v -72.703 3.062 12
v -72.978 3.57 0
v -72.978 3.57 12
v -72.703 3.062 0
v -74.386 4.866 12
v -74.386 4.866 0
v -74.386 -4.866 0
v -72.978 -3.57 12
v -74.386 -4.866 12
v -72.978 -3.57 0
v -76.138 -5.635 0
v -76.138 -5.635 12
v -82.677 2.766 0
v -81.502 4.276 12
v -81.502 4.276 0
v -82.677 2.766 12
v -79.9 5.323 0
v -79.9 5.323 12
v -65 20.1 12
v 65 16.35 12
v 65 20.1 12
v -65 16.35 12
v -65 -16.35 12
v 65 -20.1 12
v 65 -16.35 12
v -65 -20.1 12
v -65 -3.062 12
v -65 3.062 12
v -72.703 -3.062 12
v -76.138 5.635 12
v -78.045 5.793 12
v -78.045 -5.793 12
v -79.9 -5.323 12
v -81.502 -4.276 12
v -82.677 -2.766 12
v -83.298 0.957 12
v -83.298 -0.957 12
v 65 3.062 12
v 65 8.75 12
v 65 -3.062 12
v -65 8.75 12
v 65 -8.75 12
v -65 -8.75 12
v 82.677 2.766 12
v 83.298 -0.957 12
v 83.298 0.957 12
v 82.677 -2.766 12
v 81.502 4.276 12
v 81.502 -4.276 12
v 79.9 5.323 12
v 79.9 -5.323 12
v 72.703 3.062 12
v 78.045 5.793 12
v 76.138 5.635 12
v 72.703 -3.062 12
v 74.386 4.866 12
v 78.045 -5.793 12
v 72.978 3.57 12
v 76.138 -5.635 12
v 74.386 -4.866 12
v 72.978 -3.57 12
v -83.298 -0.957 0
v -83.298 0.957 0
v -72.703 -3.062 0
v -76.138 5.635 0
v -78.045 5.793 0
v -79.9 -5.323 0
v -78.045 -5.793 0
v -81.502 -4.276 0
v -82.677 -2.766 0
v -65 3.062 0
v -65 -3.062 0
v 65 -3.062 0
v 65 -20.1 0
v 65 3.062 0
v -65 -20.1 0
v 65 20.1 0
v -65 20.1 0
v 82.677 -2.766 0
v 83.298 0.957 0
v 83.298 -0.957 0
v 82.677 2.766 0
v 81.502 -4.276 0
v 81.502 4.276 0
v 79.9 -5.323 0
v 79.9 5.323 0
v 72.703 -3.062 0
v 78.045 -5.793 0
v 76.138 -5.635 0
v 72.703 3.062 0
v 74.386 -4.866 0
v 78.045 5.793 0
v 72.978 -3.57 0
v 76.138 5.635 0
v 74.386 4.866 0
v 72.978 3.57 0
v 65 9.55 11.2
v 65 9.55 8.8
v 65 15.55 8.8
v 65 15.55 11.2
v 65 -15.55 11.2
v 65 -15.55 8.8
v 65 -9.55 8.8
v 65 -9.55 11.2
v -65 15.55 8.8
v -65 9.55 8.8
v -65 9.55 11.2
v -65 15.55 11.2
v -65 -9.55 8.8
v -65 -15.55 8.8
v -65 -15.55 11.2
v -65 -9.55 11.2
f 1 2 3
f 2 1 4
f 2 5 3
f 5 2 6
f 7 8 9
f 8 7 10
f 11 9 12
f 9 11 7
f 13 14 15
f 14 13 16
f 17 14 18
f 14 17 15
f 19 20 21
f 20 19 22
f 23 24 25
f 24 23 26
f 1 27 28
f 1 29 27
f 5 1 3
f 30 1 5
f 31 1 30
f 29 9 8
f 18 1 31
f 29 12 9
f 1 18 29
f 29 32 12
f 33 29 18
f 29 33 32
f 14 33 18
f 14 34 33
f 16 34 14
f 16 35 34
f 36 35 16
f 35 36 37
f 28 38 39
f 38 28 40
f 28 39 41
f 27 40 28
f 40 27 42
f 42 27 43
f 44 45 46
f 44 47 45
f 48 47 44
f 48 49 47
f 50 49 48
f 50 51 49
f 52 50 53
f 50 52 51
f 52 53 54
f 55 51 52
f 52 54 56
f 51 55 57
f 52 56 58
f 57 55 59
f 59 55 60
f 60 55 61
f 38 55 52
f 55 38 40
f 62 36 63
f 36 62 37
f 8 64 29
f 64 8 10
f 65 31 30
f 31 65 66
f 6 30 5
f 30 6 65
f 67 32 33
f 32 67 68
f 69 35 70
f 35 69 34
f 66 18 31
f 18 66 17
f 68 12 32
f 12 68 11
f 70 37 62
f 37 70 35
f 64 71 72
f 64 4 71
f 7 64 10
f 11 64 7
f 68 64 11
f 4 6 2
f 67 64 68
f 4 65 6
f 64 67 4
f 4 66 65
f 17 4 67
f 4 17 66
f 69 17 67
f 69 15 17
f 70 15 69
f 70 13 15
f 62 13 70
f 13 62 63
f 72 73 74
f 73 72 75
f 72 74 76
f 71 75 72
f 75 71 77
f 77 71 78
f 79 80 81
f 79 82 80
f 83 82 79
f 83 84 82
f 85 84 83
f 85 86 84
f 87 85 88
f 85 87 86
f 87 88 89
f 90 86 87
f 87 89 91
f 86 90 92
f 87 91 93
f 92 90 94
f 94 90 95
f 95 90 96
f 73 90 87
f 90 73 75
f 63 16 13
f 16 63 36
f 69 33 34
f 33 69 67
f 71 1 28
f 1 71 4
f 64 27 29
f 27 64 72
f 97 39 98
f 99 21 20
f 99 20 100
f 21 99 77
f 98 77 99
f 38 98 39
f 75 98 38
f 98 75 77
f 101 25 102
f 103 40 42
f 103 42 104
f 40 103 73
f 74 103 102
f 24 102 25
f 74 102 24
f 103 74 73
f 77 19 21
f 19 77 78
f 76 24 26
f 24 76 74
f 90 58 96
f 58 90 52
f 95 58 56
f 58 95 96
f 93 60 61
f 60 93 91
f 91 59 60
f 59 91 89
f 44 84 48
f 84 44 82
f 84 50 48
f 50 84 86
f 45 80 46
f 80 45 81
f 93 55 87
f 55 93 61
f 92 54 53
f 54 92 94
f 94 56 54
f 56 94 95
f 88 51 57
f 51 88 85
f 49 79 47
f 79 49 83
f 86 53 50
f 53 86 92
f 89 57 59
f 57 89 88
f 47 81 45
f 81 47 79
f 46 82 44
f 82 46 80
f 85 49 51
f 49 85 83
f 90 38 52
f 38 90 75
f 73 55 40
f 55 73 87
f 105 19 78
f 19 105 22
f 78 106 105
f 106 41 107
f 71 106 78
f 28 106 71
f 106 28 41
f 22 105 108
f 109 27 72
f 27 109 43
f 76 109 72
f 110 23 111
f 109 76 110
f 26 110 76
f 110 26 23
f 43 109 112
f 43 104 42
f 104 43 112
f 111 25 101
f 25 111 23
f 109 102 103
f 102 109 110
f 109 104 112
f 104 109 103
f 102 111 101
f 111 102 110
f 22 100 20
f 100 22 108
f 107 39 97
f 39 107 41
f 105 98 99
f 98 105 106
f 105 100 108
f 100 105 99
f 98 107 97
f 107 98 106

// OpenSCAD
th=12;
tw=40.2;

rs=25.1;
rd=3.2;
rw=6;

xd=11.815;
xdia=12.375;
xw=6.875;

gap=1.5;

fd=xd-gap/2;
fdia=xdia+gap/2;
fw=xw+gap/2;
fc=1.5;

md=xd+gap/2;
mdia=xdia-gap/2;
mw=xw-gap/2;

module railpeg (h=th, xover=1){

	translate([-md,0,0])
	union(){
		cylinder(r=mdia/2, h=h, center=true);

		translate([0,-mw/2,-h/2])
		cube([md+xover, mw, h]);

	}

}




module negativerailhole (h=th, xover=1){

	difference(){
		union(){
			translate([-fd,0,0])
			union(){
				cylinder(r=fdia/2, h=h, center=true);

				translate([0,-fw/2,-h/2])
				cube([fd, fw, h]);

			}
				translate([-fw/2-fc, 0,-h/2])
				rotate([0,0,-45])
				cube([fw*2, fw*2, h]);
		}

		translate([fw*3+xover, 0,0])
		cube([fw*6, fw*6, h*2], center=true);

	}
}



module rail (l=100, typea="M", typeb="F", edget=0, edgew=0){

	translate([0,0,th/2])
	difference(){
		union(){
			cube([l, tw, th], center=true);

			if(typea == "M" || typea == "m")
			{
				translate([-l/2,0,0])
				railpeg(h=th);

				translate([l/2-1,-tw/2,-th/2-edget])
				cube([1+edgew,tw,edget+.1]);
			}

			if(typeb == "M" || typeb == "m")
			{
				mirror([1,0,0])
				translate([-l/2,0,0])
				railpeg(h=th);

				translate([-l/2-edgew,-tw/2,-th/2-edget])
				cube([1+edgew,tw,edget+.1]);
			}
		}
		for(y=[-rs/2, rs/2])
			translate([0,y,th/2-rd/2]){
				translate([0,0,.5])
				cube([l+1, rw, rd+1], center=true);
				for(r=[0,180])
					rotate([0,0,r])
					translate([0,rw/2,rd/4])
					rotate([45,0,0])
					translate([-l/2-.5,-rd*sqrt(2)/2,0])
					cube([l+1, rd*sqrt(2), rd/3]);
			}

		if(typea == "F" || typea == "F")
		{
			mirror([1,0,0])
			translate([l/2,0,0])
			negativerailhole(h=th+1);
		
			translate([-l/2-edgew,-tw/2,-th/2-edget])
			cube([20+edgew,tw,edget+.1]);
		}
		
		
		if(typeb == "F" || typeb == "F")
		{
			translate([l/2,0,0])
			negativerailhole(h=th+1);

			translate([l/2-20,-tw/2,-th/2-edget])
			cube([20+edgew,tw,edget+.1]);
		}
	}
}
//negativerailhole();
//railpeg();

//rail(40);
rail (l=130, typea="M", typeb="M");
